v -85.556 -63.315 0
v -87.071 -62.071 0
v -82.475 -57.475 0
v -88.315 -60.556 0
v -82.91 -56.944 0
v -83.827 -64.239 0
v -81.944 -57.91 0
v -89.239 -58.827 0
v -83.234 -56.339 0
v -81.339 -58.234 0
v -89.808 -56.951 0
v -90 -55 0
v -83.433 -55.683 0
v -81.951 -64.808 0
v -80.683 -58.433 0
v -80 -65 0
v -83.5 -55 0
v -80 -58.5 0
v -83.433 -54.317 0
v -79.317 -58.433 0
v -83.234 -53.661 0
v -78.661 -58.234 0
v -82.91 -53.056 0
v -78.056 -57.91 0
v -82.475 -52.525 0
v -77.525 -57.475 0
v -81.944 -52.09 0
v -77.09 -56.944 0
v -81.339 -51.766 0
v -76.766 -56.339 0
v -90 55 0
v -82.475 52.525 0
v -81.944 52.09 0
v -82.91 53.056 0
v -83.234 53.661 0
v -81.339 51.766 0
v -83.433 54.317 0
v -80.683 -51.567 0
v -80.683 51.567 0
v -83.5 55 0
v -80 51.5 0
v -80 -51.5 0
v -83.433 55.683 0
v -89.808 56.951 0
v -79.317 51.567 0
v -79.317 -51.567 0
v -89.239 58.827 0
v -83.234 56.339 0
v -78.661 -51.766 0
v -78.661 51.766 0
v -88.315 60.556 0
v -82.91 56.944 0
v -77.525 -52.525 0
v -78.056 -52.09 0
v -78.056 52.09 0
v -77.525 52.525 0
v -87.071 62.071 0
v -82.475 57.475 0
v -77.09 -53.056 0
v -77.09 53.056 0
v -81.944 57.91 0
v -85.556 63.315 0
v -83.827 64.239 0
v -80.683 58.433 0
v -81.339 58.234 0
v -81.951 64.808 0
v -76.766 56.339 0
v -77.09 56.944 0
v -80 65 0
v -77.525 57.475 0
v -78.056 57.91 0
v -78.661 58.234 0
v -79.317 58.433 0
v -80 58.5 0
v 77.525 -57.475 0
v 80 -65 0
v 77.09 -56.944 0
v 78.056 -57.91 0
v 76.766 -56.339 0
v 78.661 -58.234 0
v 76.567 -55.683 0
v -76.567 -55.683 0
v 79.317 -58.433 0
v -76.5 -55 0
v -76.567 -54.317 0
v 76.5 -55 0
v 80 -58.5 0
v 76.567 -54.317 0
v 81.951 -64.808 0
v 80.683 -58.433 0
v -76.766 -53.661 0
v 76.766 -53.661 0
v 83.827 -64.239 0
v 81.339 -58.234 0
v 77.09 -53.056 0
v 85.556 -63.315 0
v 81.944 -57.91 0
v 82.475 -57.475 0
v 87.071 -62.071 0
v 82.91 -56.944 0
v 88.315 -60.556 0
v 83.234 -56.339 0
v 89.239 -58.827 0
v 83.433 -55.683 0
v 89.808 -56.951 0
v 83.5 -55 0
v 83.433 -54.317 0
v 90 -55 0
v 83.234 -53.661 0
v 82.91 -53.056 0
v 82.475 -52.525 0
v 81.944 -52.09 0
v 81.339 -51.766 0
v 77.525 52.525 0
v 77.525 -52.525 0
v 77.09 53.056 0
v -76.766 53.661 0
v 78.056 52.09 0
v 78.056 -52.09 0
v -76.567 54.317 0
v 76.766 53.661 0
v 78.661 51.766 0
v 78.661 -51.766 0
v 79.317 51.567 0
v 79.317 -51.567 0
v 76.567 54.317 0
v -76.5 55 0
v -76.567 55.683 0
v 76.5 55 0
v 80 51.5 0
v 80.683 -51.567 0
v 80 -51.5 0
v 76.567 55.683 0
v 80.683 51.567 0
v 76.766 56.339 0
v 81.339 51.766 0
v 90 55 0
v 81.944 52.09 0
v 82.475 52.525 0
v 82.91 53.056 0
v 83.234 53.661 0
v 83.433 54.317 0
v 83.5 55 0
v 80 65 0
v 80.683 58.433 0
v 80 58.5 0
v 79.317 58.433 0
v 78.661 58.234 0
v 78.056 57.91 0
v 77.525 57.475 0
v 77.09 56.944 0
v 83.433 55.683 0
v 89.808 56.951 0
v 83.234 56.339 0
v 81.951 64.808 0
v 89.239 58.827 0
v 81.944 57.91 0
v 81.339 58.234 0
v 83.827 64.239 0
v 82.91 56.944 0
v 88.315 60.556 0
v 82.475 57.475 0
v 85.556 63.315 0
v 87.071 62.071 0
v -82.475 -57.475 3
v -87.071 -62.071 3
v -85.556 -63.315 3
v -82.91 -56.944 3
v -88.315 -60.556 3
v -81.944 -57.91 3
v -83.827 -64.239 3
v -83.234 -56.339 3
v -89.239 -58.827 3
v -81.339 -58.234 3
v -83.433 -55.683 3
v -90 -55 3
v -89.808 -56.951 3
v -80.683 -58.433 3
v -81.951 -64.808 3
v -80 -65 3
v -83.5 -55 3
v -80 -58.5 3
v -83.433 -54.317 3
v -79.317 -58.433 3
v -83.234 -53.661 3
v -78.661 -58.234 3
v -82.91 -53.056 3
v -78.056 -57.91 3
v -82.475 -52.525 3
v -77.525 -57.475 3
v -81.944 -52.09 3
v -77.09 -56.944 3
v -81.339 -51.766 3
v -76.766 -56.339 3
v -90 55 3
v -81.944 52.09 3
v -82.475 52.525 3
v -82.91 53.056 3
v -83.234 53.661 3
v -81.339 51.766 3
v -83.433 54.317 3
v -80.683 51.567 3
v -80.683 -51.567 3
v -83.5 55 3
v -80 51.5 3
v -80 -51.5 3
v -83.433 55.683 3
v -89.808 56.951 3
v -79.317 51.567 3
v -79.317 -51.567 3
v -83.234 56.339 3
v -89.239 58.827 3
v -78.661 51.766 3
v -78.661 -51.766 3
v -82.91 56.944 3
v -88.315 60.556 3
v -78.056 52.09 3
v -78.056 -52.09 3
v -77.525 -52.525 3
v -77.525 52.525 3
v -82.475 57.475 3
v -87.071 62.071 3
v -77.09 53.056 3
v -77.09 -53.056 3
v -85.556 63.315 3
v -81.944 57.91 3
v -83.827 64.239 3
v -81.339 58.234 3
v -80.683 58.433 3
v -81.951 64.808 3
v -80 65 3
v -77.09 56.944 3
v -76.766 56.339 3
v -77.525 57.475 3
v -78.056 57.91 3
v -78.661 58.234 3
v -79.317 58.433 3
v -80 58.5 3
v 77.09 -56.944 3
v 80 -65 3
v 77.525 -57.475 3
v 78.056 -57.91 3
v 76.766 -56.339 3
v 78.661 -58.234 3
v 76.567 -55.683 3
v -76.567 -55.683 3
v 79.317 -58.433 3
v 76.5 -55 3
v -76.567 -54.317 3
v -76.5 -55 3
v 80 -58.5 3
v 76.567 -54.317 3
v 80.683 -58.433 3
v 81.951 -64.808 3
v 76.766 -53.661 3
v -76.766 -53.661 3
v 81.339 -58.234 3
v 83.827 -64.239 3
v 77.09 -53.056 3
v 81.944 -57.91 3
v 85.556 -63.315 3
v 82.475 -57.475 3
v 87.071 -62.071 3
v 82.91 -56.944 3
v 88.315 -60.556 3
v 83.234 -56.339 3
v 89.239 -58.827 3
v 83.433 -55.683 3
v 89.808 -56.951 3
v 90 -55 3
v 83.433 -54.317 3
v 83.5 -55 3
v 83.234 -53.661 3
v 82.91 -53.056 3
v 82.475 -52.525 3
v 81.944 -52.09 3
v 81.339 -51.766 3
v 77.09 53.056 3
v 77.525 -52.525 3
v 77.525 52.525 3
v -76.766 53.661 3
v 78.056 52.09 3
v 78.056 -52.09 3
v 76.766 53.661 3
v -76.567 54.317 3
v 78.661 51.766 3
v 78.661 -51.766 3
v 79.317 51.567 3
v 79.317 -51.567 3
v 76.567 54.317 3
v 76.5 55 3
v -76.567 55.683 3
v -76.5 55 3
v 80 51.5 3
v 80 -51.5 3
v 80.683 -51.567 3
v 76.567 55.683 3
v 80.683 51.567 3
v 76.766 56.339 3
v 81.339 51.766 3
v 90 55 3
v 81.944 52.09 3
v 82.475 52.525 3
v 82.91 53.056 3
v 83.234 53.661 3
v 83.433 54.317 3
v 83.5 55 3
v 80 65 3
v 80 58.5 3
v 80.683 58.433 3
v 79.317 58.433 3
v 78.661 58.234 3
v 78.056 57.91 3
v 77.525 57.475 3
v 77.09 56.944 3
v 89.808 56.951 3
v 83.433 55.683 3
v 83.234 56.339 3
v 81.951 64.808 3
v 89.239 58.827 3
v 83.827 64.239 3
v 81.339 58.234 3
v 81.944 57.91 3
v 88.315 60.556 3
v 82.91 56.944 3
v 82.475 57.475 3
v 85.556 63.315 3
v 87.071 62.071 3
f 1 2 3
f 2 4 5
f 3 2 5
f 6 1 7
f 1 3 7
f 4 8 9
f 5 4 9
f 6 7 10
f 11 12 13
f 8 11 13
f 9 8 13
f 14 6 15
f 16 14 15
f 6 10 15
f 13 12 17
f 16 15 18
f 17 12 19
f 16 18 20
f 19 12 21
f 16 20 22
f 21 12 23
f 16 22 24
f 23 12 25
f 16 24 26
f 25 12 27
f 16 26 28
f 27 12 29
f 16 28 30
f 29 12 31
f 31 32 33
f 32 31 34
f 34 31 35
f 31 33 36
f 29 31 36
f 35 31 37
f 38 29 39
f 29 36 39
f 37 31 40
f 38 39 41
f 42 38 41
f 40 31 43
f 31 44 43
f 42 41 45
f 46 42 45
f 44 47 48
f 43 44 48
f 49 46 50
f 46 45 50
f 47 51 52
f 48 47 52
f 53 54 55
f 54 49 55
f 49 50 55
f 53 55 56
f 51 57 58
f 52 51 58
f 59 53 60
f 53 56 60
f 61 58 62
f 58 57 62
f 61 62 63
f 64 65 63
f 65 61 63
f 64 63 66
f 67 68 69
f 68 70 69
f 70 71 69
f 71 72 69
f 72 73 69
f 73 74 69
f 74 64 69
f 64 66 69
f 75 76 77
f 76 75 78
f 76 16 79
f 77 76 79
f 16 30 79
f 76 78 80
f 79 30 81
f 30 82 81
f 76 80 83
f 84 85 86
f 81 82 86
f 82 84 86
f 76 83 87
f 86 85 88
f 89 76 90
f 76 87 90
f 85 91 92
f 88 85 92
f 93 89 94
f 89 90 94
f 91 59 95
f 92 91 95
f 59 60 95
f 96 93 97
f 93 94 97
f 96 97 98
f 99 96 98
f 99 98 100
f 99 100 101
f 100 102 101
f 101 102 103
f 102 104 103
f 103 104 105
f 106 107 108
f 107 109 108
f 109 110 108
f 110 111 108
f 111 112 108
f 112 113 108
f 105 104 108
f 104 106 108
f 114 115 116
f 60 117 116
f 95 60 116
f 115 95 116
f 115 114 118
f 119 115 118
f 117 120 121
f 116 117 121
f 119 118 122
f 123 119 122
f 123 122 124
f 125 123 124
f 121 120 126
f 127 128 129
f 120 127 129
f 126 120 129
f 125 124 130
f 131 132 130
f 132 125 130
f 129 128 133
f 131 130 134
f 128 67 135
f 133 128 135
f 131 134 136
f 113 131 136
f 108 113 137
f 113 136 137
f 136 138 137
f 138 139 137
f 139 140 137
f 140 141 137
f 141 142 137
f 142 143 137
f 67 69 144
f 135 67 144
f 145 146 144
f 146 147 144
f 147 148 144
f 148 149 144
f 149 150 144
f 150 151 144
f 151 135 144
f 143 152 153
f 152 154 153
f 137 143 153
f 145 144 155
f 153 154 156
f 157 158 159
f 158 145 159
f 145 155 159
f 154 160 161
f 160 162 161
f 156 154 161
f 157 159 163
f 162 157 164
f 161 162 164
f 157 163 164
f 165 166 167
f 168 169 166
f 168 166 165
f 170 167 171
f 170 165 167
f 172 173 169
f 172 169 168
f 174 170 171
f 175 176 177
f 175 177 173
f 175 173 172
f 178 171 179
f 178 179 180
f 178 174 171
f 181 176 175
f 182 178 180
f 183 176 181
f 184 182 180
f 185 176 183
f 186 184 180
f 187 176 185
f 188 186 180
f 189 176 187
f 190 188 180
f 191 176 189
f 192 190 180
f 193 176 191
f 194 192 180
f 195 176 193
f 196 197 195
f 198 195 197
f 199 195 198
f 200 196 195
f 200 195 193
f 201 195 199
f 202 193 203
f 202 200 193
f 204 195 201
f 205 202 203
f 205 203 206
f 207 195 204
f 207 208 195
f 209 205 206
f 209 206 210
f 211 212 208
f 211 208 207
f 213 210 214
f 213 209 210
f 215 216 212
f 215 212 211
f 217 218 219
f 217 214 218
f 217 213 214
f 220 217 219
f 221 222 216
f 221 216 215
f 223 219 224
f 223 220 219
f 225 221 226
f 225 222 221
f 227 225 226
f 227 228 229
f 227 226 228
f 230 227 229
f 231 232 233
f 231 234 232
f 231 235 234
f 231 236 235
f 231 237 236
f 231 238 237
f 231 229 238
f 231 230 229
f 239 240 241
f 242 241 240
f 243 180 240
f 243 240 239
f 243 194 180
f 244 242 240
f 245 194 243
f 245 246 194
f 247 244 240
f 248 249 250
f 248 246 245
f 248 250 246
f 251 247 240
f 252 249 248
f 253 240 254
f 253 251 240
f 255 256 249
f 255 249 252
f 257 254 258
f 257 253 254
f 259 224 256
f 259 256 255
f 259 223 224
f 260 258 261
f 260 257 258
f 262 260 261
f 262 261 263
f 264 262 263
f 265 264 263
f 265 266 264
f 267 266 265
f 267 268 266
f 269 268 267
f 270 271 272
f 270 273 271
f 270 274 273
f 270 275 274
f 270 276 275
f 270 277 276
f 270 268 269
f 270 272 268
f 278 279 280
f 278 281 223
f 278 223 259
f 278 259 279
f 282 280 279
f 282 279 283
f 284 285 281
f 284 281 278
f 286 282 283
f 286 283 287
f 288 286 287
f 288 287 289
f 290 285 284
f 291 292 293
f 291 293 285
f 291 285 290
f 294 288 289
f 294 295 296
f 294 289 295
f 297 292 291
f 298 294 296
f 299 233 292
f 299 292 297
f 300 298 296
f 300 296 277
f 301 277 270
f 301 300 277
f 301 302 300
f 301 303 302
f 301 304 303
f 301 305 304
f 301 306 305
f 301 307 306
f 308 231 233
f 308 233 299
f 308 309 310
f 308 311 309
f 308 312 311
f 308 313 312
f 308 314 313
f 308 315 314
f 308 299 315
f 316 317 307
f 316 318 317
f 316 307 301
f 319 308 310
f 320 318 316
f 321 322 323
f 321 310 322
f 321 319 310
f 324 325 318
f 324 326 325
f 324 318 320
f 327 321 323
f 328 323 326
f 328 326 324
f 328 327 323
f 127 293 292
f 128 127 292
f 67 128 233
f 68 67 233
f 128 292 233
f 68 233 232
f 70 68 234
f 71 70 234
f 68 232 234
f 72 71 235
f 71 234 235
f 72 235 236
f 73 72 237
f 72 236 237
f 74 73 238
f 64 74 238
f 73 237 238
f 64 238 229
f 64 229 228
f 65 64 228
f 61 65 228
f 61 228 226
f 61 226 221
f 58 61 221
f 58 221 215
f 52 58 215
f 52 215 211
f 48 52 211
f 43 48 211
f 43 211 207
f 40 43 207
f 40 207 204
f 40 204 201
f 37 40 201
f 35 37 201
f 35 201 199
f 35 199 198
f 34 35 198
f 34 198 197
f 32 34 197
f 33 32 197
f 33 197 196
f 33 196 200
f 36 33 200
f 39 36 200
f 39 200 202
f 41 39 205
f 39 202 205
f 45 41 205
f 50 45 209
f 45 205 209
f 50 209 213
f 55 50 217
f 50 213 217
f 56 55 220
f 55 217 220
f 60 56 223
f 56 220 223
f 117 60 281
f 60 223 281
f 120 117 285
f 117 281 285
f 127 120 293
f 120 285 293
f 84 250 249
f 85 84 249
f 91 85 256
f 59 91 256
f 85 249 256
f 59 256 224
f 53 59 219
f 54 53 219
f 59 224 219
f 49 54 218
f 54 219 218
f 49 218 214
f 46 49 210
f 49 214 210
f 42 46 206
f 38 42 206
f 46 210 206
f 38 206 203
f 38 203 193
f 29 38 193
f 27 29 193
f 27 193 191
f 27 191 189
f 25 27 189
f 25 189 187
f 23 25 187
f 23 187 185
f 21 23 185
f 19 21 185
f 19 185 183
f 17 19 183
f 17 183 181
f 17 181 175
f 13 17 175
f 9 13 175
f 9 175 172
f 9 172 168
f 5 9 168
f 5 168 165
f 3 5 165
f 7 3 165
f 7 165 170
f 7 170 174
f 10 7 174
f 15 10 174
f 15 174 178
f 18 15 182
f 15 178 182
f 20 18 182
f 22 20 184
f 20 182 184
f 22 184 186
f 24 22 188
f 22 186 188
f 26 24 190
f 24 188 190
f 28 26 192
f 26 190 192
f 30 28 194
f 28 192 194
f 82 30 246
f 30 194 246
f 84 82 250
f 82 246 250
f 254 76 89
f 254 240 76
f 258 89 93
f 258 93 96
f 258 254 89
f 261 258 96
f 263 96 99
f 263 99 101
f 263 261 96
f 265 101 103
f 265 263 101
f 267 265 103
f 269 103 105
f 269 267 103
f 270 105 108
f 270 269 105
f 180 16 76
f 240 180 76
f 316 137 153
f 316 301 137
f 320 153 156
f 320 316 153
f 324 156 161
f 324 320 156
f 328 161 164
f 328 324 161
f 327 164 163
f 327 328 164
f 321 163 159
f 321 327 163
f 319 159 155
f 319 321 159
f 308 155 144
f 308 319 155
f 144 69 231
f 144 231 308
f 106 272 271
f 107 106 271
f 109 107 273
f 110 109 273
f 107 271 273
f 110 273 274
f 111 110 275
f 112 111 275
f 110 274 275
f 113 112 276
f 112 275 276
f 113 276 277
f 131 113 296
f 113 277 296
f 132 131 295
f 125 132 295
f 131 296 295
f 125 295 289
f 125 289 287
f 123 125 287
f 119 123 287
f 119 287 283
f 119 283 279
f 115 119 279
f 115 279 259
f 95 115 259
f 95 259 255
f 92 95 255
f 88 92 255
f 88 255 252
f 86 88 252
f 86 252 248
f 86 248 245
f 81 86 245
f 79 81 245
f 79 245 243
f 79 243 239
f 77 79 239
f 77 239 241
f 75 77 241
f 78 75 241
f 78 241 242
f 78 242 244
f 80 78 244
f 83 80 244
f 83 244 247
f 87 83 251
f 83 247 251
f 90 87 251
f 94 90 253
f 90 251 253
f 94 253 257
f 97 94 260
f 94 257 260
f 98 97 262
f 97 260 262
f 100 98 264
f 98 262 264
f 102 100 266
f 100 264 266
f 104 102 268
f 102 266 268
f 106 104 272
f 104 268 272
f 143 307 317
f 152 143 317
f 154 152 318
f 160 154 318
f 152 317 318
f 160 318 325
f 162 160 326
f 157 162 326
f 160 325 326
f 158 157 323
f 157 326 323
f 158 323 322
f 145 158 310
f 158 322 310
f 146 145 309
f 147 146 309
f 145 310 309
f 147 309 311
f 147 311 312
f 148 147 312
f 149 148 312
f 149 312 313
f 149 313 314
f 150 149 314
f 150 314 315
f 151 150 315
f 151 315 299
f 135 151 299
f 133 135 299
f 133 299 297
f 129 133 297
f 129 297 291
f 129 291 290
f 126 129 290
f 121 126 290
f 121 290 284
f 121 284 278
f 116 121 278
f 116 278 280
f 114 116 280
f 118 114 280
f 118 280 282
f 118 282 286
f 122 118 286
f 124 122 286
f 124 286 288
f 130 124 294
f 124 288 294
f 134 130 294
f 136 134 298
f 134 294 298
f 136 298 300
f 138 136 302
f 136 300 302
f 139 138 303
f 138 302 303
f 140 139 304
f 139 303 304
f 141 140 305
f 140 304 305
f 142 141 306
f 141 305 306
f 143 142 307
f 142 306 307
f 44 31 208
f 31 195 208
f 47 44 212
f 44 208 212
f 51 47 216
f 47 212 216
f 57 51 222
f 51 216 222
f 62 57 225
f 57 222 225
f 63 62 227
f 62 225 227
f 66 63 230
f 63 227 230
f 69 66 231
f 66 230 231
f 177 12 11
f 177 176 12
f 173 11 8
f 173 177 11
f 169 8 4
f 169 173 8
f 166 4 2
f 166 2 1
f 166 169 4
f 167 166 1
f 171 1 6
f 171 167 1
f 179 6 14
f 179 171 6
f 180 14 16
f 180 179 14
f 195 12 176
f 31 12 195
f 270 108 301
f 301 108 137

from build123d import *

# Parameters (mm, degrees)
SKETCH_1_W          = 180
SKETCH_1_H          = 130
EXTRUDE_1_DEPTH     = 3
FILLET_1_R          = 10
SKETCH_2_R          = 3.5
CUT_EXTRUDE_1_DEPTH = 112.05854312


with BuildPart() as part:
    # 草图1 → 凸台-拉伸1 (new body)
    with BuildSketch(Plane.XY):
        Rectangle(SKETCH_1_W, SKETCH_1_H)
    extrude(amount=EXTRUDE_1_DEPTH)

    # 圆角1
    fillet_1_edges = [part.edges().sort_by_distance(p)[0] for p in [
        (90, -65, 1.5),
        (-90, -65, 1.5),
        (-90, 65, 1.5),
        (90, 65, 1.5),
    ]]
    fillet(fillet_1_edges, radius=FILLET_1_R)

    # 草图2 → 切除-拉伸1 (cut, through all)
    with BuildSketch(Plane.XY.offset(3)):
        with Locations((-80, 55)):
            Circle(SKETCH_2_R)
        with Locations((-80, -55)):
            Circle(SKETCH_2_R)
        with Locations((80, 55)):
            Circle(SKETCH_2_R)
        with Locations((80, -55)):
            Circle(SKETCH_2_R)
    extrude(amount=-CUT_EXTRUDE_1_DEPTH, mode=Mode.SUBTRACT)


solid = part.part
